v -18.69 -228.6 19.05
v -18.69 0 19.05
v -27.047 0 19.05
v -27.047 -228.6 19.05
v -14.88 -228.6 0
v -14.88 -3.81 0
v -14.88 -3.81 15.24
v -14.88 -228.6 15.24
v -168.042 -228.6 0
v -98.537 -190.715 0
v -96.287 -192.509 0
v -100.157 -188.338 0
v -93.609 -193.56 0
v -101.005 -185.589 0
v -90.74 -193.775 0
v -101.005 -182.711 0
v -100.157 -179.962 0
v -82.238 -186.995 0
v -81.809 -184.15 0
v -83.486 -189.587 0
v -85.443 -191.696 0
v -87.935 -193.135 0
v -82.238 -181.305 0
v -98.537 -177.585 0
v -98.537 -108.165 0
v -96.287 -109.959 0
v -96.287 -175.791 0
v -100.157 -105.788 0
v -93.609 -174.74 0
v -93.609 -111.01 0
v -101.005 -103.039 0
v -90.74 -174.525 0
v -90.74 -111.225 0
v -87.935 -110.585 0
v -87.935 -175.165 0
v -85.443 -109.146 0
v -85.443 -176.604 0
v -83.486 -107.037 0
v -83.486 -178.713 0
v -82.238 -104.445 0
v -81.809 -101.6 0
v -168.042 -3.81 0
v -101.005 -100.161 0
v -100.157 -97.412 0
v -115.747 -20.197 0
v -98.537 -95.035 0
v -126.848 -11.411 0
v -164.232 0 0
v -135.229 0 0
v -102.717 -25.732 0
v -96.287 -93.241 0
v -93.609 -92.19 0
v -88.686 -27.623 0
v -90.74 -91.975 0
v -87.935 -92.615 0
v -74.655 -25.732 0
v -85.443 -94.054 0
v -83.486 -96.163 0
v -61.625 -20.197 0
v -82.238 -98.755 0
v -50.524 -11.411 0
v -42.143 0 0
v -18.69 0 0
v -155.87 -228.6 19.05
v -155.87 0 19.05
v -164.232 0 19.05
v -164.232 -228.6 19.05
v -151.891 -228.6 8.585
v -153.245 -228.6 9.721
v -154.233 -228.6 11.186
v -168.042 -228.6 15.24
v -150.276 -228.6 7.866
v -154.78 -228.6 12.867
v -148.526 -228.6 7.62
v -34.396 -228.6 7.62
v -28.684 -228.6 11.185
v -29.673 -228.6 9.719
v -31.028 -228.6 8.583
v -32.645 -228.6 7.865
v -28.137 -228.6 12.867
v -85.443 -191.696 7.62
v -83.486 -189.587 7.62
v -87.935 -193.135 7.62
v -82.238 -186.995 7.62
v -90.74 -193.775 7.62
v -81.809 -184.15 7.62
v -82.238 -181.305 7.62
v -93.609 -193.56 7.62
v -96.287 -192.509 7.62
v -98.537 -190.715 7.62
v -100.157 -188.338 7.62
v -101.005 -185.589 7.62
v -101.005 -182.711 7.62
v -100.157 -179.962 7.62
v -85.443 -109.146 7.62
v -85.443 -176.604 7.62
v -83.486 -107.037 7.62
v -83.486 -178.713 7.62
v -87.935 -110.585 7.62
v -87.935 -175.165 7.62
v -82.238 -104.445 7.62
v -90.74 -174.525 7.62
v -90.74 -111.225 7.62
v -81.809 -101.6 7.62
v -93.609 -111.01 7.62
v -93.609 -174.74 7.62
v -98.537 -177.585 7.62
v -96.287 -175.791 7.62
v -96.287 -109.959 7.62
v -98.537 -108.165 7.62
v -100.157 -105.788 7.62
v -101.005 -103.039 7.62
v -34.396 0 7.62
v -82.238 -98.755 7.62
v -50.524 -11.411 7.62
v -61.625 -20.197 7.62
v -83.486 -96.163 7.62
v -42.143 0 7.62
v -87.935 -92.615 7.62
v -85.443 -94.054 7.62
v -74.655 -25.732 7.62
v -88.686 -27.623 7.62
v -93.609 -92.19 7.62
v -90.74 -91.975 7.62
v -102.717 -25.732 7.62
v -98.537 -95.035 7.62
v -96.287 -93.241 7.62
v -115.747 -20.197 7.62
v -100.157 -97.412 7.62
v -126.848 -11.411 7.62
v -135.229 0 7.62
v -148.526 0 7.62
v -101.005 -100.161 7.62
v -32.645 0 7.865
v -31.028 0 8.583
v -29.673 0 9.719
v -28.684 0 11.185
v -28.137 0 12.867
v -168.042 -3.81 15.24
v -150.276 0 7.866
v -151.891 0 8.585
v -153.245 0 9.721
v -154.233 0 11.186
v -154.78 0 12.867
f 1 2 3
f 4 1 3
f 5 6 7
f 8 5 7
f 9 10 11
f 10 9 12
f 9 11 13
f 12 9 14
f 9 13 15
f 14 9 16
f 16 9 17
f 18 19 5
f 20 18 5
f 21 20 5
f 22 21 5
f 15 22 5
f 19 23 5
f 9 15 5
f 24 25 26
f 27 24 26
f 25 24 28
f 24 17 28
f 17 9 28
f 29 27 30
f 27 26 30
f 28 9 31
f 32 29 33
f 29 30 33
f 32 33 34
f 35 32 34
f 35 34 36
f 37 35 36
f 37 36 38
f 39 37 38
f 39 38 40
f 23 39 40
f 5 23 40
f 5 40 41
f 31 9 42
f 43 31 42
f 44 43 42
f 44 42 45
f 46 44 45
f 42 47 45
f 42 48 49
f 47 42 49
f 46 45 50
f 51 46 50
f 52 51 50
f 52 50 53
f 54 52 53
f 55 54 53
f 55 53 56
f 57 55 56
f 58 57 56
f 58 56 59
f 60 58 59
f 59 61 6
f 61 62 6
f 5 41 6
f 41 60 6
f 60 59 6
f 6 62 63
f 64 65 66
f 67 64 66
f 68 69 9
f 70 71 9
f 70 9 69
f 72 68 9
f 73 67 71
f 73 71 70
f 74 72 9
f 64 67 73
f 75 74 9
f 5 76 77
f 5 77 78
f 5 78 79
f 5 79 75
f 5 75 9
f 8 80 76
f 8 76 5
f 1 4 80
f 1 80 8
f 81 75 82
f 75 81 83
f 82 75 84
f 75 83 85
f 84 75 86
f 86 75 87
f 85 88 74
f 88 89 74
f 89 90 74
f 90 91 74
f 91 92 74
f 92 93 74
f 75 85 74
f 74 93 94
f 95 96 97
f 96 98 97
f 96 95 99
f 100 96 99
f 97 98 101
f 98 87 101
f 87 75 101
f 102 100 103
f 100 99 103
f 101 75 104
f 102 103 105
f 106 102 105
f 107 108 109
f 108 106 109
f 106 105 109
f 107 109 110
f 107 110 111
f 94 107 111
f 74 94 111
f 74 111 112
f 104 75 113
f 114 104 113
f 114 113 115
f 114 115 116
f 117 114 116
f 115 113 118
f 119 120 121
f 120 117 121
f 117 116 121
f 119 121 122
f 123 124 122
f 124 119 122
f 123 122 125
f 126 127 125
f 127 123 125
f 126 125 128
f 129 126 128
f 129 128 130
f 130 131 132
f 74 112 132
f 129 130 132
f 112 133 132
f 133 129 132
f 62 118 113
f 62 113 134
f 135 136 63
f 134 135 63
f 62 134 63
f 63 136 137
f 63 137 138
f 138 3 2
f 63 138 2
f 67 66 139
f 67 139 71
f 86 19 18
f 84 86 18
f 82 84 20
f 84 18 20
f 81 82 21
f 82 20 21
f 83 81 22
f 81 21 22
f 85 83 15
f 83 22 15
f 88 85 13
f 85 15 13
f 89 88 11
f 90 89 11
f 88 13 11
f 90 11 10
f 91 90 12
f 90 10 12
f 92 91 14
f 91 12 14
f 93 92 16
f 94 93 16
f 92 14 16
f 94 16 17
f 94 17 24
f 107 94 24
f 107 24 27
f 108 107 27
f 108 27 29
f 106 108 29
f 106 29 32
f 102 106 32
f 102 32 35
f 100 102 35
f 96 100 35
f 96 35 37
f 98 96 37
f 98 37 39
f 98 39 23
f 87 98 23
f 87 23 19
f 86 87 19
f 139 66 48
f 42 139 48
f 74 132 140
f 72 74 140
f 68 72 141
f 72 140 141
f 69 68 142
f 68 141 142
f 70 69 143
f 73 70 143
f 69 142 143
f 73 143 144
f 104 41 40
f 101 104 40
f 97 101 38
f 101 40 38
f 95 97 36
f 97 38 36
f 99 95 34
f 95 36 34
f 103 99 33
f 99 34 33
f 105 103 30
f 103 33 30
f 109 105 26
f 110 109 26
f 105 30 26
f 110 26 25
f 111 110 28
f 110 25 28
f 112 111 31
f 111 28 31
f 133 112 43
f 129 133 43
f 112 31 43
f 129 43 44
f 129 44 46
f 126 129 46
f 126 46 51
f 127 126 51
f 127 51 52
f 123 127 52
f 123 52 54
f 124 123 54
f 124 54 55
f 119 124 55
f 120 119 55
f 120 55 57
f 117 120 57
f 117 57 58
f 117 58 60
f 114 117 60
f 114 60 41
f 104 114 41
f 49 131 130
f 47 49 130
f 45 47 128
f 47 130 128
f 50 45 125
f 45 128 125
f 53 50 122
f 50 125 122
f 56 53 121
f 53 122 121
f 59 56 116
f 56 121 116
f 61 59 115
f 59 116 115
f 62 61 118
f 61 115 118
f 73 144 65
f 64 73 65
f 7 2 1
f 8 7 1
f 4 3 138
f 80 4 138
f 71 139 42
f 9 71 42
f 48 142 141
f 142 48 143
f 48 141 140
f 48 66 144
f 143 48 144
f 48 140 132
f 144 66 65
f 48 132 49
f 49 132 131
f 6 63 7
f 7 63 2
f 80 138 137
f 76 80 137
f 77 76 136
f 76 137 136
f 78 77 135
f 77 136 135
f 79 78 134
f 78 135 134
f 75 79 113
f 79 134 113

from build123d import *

# Parameters (mm, degrees)
F1_DEPTH = 228.6
F2_SIZE  = 3.81
F4_DEPTH = 25.4
F5_R     = 9.652
F6_DEPTH = 25.4


# Not quite as in the source:
# - a feature names something its author has since deleted; it is built from what else it names


with BuildPart() as f1:
    # F0 (on Front) → F1 (new body)
    with BuildSketch(Plane.XZ):
        with BuildLine():
            Line((-168.0421057219, 19.05), (-168.0421057219, 0))
            Line((-168.0421057219, 0), (-14.8801057219, 0))
            Line((-14.8801057219, 0), (-14.8801057219, 19.05))
            Line((-14.8801057219, 19.05), (-27.0467057219, 19.05))
            Line((-27.0467057219, 19.05), (-28.1368765378, 12.8673340718))
            ThreePointArc((-28.1368765378, 12.8673340718), (-30.3108938413, 9.1037793136), (-34.3961226724, 7.62))
            Line((-34.3961226724, 7.62), (-91.4611057219, 7.62))
            Line((-91.4611057219, 7.62), (-148.5260887714, 7.62))
            ThreePointArc((-148.5260887714, 7.62), (-152.6077900929, 9.1056177862), (-154.7796180031, 12.8673340718))
            Line((-154.7796180031, 12.8673340718), (-155.8697888189, 19.05))
            Line((-155.8697888189, 19.05), (-168.0421057219, 19.05))
        make_face()
    extrude(amount=F1_DEPTH)

    # F2
    f2_edges = [f1.edges().sort_by_distance(p)[0] for p in [
        (-168.042106, -114.3, 19.05),
        (-14.880106, -114.3, 19.05),
        (-14.880106, 0, 9.525),
        (-168.042106, 0, 9.525),
    ]]
    chamfer(f2_edges, length=F2_SIZE)

    # F3 (on face) → F4 (cut)
    with BuildSketch(Plane.XY.offset(7.62)):
        with BuildLine():
            Line((-42.1433808409, 0), (-135.2288363374, 0))
            ThreePointArc((-135.2288363374, 0), (-88.6861085892, -27.6225), (-42.1433808409, 0))
        make_face()
    extrude(amount=-F4_DEPTH, mode=Mode.SUBTRACT)

    # F5 (on face) → F6 (cut)
    with BuildSketch(Plane(origin=(0, 0, 0), x_dir=(1, 0, 0), z_dir=(0, 0, -1))):
        with Locations((-91.4611057219, 101.6)):
            Circle(F5_R)
        with Locations((-91.4611057219, 184.15)):
            Circle(F5_R)
    extrude(amount=-F6_DEPTH, mode=Mode.SUBTRACT)


solid = f1.part
